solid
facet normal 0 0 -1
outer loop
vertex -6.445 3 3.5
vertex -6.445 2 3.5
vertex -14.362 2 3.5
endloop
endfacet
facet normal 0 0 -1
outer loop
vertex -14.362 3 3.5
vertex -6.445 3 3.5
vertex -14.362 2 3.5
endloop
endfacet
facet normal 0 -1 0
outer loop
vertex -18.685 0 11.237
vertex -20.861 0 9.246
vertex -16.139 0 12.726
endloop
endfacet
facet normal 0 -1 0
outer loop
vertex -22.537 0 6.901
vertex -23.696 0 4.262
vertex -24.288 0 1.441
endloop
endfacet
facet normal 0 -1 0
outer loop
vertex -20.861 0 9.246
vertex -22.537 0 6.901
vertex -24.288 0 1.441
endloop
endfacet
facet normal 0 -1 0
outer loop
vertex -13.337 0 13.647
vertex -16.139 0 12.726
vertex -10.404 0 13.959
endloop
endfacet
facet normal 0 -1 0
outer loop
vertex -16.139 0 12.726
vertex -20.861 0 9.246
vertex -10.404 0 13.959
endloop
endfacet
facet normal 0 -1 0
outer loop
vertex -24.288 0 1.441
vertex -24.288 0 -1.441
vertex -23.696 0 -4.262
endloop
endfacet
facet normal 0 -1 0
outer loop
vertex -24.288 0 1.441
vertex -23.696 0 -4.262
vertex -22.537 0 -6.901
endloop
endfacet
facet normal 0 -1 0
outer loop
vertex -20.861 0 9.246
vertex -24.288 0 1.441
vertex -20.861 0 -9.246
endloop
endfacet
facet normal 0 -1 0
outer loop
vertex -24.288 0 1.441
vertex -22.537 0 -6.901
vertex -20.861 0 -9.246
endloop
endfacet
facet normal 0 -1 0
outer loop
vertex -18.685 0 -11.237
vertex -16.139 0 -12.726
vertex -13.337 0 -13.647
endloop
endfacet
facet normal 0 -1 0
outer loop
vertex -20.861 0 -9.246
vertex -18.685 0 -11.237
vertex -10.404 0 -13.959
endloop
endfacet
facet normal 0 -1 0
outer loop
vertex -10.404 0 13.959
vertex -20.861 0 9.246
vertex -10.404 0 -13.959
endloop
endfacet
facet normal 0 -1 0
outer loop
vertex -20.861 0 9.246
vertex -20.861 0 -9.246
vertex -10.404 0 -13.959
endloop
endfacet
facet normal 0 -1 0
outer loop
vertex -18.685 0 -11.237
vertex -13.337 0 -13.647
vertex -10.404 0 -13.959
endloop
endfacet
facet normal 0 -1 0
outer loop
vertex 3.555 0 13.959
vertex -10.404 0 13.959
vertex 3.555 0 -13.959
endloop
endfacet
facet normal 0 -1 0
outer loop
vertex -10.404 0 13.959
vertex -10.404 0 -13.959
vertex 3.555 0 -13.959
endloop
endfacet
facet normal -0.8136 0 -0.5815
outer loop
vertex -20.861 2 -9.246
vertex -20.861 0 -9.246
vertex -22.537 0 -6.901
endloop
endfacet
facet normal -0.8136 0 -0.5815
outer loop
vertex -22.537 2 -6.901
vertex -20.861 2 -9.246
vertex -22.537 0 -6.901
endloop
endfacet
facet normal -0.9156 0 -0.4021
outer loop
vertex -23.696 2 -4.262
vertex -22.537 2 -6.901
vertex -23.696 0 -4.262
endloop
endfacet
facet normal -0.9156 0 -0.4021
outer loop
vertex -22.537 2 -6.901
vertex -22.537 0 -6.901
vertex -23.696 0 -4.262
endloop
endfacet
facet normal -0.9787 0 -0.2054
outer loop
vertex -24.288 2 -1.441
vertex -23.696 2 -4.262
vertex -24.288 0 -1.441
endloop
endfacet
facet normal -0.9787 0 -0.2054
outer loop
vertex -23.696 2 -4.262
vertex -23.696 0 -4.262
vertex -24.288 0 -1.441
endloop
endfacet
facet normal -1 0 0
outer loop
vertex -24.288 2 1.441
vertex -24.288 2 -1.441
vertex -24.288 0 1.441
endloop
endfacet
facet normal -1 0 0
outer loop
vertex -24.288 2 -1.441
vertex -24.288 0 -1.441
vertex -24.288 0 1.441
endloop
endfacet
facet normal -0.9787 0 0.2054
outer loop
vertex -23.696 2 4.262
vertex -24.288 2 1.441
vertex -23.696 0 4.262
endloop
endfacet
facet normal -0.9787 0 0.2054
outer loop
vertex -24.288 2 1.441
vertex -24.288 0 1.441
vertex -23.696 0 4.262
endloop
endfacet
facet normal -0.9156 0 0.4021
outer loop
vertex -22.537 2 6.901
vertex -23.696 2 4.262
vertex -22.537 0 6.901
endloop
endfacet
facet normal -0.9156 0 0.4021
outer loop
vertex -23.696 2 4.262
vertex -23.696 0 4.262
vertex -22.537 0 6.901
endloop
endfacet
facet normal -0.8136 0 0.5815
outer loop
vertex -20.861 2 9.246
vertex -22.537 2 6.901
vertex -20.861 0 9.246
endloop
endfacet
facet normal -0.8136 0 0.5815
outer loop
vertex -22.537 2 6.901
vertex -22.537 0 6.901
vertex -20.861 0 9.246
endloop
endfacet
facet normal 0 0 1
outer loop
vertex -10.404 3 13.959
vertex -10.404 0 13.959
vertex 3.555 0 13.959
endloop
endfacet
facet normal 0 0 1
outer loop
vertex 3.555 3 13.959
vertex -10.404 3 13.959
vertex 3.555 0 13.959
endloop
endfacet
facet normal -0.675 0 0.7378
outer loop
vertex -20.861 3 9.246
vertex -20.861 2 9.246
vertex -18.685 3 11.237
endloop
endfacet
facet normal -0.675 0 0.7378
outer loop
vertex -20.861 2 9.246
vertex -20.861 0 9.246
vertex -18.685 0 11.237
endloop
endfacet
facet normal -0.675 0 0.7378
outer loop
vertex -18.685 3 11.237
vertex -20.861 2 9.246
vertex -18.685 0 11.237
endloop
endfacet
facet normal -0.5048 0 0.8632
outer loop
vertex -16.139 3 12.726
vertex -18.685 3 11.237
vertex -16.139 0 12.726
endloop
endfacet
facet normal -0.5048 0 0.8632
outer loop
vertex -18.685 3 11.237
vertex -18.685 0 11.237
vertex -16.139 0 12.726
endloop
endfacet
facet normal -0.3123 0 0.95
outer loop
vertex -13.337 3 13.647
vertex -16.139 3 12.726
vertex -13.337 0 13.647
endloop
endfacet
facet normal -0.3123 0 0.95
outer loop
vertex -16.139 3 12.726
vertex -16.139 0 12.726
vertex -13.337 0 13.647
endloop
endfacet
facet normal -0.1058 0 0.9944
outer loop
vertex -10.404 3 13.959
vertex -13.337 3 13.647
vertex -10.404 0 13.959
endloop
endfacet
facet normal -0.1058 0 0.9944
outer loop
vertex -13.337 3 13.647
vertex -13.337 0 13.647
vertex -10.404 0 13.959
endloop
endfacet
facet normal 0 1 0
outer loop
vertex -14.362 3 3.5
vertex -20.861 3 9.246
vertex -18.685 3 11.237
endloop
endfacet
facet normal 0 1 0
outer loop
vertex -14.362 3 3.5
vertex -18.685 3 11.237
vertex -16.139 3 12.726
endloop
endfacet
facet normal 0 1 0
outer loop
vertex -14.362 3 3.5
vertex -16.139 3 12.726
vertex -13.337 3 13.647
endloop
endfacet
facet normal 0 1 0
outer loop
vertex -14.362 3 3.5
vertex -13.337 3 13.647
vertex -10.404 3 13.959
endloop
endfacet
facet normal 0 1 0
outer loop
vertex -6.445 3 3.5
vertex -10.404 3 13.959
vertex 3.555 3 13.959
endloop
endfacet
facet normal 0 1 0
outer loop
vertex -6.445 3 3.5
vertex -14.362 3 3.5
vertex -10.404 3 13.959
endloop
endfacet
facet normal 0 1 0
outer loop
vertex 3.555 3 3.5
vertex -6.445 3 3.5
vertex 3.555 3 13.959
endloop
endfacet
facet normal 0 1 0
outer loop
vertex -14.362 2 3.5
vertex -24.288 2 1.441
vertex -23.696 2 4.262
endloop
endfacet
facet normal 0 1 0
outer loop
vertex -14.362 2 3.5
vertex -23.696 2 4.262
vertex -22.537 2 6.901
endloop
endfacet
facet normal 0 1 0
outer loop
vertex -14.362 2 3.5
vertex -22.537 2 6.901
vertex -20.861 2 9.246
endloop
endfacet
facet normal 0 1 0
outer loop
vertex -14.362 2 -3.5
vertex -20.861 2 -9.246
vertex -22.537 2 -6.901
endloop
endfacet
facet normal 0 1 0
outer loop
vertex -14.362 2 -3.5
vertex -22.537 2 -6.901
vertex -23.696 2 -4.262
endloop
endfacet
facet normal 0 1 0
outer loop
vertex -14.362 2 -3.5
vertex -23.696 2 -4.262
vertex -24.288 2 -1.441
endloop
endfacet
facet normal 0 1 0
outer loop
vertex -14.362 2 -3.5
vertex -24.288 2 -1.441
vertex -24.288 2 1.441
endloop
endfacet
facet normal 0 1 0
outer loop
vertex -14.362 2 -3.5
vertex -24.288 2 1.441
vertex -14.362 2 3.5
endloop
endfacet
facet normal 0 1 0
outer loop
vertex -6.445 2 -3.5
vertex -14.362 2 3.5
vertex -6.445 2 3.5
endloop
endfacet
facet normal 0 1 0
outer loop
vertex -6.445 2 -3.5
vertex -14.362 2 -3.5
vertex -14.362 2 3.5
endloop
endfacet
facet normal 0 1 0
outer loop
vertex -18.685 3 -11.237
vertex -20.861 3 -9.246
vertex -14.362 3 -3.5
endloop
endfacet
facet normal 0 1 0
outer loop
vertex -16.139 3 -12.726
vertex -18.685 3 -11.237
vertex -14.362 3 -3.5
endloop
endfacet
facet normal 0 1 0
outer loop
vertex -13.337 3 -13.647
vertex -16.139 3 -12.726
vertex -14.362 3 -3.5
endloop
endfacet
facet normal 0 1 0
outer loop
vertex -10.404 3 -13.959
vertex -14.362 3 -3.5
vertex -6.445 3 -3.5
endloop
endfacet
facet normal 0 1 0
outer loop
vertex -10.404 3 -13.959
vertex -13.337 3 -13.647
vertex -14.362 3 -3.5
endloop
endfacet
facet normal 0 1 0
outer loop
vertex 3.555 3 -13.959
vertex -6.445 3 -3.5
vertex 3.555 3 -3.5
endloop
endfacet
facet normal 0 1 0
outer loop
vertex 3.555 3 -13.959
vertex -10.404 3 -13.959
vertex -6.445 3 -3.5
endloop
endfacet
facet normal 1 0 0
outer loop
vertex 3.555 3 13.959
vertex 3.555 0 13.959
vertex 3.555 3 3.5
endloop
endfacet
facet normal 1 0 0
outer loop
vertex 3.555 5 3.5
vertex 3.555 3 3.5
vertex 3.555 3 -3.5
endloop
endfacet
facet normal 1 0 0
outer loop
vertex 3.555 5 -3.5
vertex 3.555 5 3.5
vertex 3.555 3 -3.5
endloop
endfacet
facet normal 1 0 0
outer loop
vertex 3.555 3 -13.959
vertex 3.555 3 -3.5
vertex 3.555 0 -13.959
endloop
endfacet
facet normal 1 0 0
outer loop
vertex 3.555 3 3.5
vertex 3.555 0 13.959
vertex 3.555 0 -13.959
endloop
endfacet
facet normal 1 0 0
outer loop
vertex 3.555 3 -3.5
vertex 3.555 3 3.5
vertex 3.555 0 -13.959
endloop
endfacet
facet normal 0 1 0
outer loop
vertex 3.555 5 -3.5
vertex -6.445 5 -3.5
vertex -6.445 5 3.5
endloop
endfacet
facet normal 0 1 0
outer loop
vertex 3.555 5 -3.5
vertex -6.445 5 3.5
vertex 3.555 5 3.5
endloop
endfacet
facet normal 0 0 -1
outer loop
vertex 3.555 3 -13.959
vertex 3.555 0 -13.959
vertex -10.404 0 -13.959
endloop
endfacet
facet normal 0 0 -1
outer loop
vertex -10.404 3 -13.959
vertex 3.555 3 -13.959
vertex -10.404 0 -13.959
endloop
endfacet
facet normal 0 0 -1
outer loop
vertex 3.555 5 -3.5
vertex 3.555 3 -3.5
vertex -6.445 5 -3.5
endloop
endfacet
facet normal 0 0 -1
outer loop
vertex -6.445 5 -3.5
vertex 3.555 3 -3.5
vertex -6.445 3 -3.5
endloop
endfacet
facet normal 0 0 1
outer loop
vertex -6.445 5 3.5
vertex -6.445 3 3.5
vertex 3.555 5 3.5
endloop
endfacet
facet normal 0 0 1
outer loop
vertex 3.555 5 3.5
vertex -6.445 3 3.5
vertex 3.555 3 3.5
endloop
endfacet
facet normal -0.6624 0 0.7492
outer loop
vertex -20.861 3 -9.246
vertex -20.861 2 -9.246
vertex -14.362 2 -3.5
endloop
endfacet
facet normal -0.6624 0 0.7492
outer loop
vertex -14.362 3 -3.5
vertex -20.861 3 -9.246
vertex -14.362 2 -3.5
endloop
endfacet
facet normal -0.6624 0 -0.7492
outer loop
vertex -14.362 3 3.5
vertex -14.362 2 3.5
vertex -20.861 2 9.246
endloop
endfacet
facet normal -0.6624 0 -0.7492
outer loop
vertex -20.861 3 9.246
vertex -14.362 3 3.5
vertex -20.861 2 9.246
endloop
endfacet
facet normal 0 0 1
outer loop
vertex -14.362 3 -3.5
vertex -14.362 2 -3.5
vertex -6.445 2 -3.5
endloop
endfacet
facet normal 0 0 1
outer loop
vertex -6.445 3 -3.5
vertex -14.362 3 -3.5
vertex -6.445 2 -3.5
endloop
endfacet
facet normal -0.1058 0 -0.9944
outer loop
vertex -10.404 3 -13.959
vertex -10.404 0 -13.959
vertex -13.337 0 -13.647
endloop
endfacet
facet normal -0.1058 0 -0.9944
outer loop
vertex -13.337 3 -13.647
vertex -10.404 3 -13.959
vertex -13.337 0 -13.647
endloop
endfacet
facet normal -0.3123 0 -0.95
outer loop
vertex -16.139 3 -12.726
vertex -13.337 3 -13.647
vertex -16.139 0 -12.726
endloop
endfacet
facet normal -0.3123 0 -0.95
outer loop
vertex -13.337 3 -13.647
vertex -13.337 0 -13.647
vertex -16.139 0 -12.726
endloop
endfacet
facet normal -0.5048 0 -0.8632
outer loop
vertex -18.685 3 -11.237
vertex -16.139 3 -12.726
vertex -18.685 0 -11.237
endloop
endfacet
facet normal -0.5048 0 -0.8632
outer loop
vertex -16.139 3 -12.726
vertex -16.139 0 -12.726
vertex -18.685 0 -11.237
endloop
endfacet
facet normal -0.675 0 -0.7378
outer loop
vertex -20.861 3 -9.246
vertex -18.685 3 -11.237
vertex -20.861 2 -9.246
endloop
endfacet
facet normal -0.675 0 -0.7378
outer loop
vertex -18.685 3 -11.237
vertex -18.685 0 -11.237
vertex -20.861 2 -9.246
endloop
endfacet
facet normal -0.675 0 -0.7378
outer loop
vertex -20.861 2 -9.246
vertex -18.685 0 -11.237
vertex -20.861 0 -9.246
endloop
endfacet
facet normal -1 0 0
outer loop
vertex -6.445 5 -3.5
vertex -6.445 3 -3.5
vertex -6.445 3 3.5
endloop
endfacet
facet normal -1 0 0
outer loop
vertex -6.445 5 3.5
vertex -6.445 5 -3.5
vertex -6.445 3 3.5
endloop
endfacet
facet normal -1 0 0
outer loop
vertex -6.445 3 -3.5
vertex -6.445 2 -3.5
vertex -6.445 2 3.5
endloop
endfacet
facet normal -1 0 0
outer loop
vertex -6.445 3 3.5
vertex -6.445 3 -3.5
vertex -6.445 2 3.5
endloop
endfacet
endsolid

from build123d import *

# Parameters (mm, degrees)
BOSS_EXTRUDE2_DEPTH = 2
BOSS_EXTRUDE3_DEPTH = 3
SKETCH1_7_W         = 10
SKETCH1_7_H         = 7
BOSS_EXTRUDE5_DEPTH = 5


with BuildPart() as part:
    # Sketch1 → Boss-Extrude2 (new body)
    with BuildSketch(Plane(origin=(0, 0, 0), x_dir=(1, 0, 0), z_dir=(0, 1, 0))):
        with BuildLine():
            Line((-6.445352893, 3.5), (-14.362421277, 3.5))
            Line((-14.362421277, 3.5), (-20.861114748, 9.245921608))
            ThreePointArc((-20.861114748, 9.245921608), (-24.362421277, 0), (-20.861114748, -9.245921608))
            Line((-20.861114748, -9.245921608), (-14.362421277, -3.5))
            Line((-14.362421277, -3.5), (-6.445352893, -3.5))
            Line((-6.445352893, -3.5), (-6.445352893, 3.5))
        make_face()
    extrude(amount=BOSS_EXTRUDE2_DEPTH)

    # Sketch1<5> → Boss-Extrude3 (add)
    with BuildSketch(Plane(origin=(0, 0, 0), x_dir=(1, 0, 0), z_dir=(0, 1, 0))):
        with BuildLine():
            Line((3.554647107, 3.5), (3.554647107, 13.958534192))
            Line((3.554647107, 13.958534192), (-10.403887085, 13.958534192))
            ThreePointArc((-10.403887085, 13.958534192), (-16.138918204, 12.725961451), (-20.861114748, 9.245921608))
            Line((-20.861114748, 9.245921608), (-14.362421277, 3.5))
            Line((-14.362421277, 3.5), (3.554647107, 3.5))
        make_face()
        with BuildLine():
            Line((-14.362421277, -3.5), (-20.861114748, -9.245921608))
            ThreePointArc((-20.861114748, -9.245921608), (-16.138918204, -12.725961451), (-10.403887085, -13.958534192))
            Line((-10.403887085, -13.958534192), (3.554647107, -13.958534192))
            Line((3.554647107, -13.958534192), (3.554647107, -3.5))
            Line((3.554647107, -3.5), (-14.362421277, -3.5))
        make_face()
    extrude(amount=BOSS_EXTRUDE3_DEPTH)

    # Sketch1<7> → Boss-Extrude5 (add)
    with BuildSketch(Plane(origin=(0, 0, 0), x_dir=(1, 0, 0), z_dir=(0, 1, 0))):
        with Locations((-1.445352893, 0)):
            Rectangle(SKETCH1_7_W, SKETCH1_7_H)
    extrude(amount=BOSS_EXTRUDE5_DEPTH)


solid = part.part
